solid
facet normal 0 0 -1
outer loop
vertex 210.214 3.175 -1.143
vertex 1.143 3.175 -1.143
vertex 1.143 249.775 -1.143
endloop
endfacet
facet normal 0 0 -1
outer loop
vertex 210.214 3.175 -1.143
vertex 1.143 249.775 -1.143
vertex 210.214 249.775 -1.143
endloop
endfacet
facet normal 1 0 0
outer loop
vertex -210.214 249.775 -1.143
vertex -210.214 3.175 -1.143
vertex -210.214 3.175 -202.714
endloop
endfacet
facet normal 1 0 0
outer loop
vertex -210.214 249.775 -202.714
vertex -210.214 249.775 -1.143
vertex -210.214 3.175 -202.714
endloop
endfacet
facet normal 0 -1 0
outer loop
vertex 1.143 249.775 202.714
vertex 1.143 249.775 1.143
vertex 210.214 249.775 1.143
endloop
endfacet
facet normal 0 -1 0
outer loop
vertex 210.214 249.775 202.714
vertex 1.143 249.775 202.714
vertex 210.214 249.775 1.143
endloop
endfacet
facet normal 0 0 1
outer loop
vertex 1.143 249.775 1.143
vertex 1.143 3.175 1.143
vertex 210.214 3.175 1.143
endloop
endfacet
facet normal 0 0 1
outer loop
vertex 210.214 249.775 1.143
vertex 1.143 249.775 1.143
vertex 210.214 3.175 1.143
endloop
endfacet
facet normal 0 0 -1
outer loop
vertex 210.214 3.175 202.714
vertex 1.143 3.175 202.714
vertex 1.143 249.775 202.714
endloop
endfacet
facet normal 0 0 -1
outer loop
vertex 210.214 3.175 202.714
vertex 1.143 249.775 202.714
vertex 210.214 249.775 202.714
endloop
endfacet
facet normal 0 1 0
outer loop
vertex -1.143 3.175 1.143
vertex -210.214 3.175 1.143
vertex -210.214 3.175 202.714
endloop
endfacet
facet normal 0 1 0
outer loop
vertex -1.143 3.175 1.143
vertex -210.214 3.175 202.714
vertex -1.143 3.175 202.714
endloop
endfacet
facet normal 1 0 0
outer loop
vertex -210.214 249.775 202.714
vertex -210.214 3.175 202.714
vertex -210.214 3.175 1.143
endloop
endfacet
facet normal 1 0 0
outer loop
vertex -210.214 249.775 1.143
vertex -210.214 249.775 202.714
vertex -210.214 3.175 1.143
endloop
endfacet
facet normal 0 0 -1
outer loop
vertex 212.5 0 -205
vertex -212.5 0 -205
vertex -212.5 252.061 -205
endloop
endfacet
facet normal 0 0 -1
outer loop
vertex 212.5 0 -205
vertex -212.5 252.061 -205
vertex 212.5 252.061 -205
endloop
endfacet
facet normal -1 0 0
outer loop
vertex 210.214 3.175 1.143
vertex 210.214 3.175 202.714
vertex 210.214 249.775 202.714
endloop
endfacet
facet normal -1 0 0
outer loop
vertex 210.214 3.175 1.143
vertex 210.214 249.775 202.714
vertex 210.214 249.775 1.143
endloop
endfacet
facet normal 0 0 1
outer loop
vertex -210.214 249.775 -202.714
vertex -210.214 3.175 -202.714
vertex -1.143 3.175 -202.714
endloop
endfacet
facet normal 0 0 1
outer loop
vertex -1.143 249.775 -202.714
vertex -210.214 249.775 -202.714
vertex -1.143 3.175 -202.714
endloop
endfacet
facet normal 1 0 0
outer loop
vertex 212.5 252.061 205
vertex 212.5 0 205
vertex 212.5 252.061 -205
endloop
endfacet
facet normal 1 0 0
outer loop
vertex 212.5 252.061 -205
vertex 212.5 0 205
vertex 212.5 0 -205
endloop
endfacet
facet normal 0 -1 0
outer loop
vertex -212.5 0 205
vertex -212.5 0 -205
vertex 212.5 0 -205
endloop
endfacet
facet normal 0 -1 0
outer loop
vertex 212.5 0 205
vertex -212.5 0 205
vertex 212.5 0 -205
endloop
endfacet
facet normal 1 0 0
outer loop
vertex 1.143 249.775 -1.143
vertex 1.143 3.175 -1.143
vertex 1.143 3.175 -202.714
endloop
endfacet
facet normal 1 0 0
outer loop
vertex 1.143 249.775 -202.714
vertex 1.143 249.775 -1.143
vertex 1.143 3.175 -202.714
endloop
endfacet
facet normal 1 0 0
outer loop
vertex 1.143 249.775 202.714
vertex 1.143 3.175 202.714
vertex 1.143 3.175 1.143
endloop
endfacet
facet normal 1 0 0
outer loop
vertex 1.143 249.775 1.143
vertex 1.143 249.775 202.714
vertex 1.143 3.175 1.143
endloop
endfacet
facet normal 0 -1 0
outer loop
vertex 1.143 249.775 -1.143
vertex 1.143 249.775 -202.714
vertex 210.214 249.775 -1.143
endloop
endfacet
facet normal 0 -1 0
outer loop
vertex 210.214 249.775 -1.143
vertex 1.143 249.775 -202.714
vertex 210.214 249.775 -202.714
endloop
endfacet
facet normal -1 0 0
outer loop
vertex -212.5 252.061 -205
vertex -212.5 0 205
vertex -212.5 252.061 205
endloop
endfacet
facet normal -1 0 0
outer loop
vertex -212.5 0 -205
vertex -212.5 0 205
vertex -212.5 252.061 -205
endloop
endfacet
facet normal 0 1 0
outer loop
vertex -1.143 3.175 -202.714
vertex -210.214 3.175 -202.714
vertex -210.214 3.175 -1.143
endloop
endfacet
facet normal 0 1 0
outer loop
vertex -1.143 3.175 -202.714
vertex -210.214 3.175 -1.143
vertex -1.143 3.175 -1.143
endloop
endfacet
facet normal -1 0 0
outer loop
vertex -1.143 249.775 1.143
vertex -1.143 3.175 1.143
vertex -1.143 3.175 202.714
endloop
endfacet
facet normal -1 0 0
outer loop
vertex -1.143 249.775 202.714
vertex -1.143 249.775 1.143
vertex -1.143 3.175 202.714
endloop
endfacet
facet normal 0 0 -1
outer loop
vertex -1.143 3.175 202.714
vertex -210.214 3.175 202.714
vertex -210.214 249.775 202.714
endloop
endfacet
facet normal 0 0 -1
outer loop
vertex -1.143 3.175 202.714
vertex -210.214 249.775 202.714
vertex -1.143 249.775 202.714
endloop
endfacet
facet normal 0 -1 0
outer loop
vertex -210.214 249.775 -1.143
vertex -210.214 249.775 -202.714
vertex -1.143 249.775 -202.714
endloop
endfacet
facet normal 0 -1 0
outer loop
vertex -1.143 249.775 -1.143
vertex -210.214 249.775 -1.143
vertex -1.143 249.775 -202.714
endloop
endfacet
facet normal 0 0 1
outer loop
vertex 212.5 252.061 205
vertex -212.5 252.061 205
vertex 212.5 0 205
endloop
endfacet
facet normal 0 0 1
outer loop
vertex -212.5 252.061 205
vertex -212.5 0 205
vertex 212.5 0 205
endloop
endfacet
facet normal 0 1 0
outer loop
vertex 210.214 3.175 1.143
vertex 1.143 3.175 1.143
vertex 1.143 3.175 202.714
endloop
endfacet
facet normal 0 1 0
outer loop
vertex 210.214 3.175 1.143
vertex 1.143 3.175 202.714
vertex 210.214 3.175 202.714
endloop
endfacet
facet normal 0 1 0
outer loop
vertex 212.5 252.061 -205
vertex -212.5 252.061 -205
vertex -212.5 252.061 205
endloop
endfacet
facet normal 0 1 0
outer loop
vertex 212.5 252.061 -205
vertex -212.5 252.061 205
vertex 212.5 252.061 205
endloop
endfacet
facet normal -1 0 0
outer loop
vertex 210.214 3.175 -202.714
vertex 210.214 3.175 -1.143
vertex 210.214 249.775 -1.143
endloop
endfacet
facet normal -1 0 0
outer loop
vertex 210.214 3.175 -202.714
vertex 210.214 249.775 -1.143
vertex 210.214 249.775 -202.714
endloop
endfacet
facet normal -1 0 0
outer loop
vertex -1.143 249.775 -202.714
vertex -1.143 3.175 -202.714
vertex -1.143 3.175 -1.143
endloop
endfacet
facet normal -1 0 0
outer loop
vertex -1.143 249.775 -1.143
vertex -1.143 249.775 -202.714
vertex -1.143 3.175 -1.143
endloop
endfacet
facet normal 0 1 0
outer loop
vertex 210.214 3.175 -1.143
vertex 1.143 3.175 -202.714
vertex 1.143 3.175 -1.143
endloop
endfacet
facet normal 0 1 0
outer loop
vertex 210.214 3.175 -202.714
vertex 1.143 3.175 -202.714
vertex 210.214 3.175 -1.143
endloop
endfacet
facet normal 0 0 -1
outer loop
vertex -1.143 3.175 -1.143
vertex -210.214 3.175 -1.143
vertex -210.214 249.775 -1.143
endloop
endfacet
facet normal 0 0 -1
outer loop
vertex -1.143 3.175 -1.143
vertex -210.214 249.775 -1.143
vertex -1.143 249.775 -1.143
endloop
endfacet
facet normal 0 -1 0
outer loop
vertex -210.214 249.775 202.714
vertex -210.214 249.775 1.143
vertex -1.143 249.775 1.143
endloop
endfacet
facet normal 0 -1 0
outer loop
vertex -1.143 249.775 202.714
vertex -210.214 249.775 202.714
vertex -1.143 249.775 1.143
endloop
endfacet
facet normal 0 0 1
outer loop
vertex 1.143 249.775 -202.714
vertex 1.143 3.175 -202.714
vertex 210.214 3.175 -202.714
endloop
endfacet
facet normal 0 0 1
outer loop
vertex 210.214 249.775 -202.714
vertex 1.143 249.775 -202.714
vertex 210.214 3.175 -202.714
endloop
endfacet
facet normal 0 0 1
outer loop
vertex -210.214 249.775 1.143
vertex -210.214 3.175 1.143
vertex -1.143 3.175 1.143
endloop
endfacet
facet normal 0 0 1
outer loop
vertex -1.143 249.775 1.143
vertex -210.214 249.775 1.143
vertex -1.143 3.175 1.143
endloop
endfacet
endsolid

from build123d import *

# Parameters (mm, degrees)
SKETCH1_W    = 425
SKETCH1_H    = 410
BOTTOM_DEPTH = 3.175
SKETCH2_W    = 425
SKETCH2_H    = 410
SKETCH2_W_2  = 420.428
SKETCH2_H_2  = 405.428
SKETCH2_W_3  = 2.286
SKETCH2_H_3  = 201.571
SKETCH2_W_4  = 209.071
SKETCH2_H_4  = 2.286
SIDES_DEPTH  = 246.6
SKETCH3_W    = 425
SKETCH3_H    = 410
TOP_DEPTH    = 2.286


with BuildPart() as part:
    # Sketch1 → Bottom (new body)
    with BuildSketch(Plane(origin=(0, 0, 0), x_dir=(1, 0, 0), z_dir=(0, 1, 0))):
        Rectangle(SKETCH1_W, SKETCH1_H)
    extrude(amount=BOTTOM_DEPTH)

    # Sketch2 → Sides (add)
    with BuildSketch(Plane(origin=(0, 3.175, 0), x_dir=(1, 0, 0), z_dir=(0, 1, 0))):
        Rectangle(SKETCH2_W, SKETCH2_H)
        Rectangle(SKETCH2_W_2, SKETCH2_H_2, mode=Mode.SUBTRACT)
        with Locations((0, 101.9285)):
            Rectangle(SKETCH2_W_3, SKETCH2_H_3)
        with Locations((105.6785, 0)):
            Rectangle(SKETCH2_W_4, SKETCH2_H_4)
        with Locations((0, -101.9285)):
            Rectangle(SKETCH2_W_3, SKETCH2_H_3)
        Rectangle(SKETCH2_W_3, SKETCH2_H_4)
        with Locations((-105.6785, 0)):
            Rectangle(SKETCH2_W_4, SKETCH2_H_4)
    extrude(amount=SIDES_DEPTH)

    # Sketch3 → Top (add)
    with BuildSketch(Plane(origin=(0, 249.775, 0), x_dir=(1, 0, 0), z_dir=(0, 1, 0))):
        Rectangle(SKETCH3_W, SKETCH3_H)
    extrude(amount=TOP_DEPTH)


solid = part.part
